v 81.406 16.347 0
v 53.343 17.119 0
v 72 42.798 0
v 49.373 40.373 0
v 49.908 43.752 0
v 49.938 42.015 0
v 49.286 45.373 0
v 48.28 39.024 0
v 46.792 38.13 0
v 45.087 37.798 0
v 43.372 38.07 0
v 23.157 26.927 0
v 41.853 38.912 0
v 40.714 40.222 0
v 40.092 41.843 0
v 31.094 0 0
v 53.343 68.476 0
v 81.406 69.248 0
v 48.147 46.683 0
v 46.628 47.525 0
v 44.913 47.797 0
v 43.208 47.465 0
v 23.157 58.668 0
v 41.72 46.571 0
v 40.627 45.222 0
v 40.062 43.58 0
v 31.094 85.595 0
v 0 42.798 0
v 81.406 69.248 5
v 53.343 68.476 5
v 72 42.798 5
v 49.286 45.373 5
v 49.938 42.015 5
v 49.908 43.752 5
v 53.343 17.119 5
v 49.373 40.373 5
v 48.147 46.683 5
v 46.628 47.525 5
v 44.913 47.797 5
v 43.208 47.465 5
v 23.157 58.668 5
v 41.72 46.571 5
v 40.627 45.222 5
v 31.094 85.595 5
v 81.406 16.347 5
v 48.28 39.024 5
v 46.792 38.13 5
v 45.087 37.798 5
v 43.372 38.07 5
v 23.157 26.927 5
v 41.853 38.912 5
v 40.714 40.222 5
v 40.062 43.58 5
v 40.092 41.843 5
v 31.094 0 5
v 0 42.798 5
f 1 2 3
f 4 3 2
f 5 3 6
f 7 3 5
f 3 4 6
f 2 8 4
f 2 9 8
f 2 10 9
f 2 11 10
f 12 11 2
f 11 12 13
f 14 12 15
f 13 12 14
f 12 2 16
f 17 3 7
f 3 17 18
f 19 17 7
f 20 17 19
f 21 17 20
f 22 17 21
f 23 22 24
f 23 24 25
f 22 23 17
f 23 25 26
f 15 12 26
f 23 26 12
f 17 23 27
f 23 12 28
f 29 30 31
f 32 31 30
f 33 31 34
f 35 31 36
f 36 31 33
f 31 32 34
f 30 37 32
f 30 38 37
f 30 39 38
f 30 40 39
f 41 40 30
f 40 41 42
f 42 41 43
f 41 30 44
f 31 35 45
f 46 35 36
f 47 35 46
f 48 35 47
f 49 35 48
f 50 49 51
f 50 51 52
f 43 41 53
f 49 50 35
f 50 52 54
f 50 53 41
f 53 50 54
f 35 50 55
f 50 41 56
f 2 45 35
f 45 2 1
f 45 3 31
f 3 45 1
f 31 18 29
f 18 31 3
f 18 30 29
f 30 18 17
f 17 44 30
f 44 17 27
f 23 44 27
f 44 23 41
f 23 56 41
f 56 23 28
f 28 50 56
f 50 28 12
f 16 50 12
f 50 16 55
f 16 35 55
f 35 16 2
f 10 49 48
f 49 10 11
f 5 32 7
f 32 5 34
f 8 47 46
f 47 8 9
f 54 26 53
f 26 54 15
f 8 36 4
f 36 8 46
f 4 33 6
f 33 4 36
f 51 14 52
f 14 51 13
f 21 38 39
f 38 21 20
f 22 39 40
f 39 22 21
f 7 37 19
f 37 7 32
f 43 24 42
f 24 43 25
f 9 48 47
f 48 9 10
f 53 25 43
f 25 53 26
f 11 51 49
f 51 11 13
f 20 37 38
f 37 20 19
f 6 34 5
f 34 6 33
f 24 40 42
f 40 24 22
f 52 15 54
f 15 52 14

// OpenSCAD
$fn = 32;

// ----------------------------------------------------------------------
// Star wheel: 5-point blunt, R45
// ----------------------------------------------------------------------

// --- parameters (mm) ---
n_points = 5;             // number of points / teeth
r_out = 45;               // tip radius
r_in = 27;                // root radius
bore_r = 5;               // centre bore radius
plate_t = 5;              // plate thickness, Z (extrusion height)
bore_d = 10;              // centre bore diameter

profile = [[0, 42.798], [23.157, 26.927], [31.094, 0], [53.343, 17.119], [81.406, 16.347], [72, 42.798], [81.406, 69.248], [53.343, 68.476], [31.094, 85.595], [23.157, 58.668]];  // primary outline, 10 points, counter clockwise
void_1 = [[49.908, 43.752], [49.286, 45.373], [48.147, 46.683], [46.628, 47.525], [44.913, 47.797], [43.208, 47.465], [41.72, 46.571], [40.627, 45.222], [40.062, 43.58], [40.092, 41.843], [40.714, 40.222], [41.853, 38.912], [43.372, 38.07], [45.087, 37.798], [46.792, 38.13], [48.28, 39.024], [49.373, 40.373], [49.938, 42.015]];  // centre bore, 18 points

// --- the one profile operation ---
difference() {
  linear_extrude(height = plate_t) polygon(points = profile);
  translate([0, 0, -1])
    linear_extrude(height = plate_t + 2) polygon(points = void_1);
}
